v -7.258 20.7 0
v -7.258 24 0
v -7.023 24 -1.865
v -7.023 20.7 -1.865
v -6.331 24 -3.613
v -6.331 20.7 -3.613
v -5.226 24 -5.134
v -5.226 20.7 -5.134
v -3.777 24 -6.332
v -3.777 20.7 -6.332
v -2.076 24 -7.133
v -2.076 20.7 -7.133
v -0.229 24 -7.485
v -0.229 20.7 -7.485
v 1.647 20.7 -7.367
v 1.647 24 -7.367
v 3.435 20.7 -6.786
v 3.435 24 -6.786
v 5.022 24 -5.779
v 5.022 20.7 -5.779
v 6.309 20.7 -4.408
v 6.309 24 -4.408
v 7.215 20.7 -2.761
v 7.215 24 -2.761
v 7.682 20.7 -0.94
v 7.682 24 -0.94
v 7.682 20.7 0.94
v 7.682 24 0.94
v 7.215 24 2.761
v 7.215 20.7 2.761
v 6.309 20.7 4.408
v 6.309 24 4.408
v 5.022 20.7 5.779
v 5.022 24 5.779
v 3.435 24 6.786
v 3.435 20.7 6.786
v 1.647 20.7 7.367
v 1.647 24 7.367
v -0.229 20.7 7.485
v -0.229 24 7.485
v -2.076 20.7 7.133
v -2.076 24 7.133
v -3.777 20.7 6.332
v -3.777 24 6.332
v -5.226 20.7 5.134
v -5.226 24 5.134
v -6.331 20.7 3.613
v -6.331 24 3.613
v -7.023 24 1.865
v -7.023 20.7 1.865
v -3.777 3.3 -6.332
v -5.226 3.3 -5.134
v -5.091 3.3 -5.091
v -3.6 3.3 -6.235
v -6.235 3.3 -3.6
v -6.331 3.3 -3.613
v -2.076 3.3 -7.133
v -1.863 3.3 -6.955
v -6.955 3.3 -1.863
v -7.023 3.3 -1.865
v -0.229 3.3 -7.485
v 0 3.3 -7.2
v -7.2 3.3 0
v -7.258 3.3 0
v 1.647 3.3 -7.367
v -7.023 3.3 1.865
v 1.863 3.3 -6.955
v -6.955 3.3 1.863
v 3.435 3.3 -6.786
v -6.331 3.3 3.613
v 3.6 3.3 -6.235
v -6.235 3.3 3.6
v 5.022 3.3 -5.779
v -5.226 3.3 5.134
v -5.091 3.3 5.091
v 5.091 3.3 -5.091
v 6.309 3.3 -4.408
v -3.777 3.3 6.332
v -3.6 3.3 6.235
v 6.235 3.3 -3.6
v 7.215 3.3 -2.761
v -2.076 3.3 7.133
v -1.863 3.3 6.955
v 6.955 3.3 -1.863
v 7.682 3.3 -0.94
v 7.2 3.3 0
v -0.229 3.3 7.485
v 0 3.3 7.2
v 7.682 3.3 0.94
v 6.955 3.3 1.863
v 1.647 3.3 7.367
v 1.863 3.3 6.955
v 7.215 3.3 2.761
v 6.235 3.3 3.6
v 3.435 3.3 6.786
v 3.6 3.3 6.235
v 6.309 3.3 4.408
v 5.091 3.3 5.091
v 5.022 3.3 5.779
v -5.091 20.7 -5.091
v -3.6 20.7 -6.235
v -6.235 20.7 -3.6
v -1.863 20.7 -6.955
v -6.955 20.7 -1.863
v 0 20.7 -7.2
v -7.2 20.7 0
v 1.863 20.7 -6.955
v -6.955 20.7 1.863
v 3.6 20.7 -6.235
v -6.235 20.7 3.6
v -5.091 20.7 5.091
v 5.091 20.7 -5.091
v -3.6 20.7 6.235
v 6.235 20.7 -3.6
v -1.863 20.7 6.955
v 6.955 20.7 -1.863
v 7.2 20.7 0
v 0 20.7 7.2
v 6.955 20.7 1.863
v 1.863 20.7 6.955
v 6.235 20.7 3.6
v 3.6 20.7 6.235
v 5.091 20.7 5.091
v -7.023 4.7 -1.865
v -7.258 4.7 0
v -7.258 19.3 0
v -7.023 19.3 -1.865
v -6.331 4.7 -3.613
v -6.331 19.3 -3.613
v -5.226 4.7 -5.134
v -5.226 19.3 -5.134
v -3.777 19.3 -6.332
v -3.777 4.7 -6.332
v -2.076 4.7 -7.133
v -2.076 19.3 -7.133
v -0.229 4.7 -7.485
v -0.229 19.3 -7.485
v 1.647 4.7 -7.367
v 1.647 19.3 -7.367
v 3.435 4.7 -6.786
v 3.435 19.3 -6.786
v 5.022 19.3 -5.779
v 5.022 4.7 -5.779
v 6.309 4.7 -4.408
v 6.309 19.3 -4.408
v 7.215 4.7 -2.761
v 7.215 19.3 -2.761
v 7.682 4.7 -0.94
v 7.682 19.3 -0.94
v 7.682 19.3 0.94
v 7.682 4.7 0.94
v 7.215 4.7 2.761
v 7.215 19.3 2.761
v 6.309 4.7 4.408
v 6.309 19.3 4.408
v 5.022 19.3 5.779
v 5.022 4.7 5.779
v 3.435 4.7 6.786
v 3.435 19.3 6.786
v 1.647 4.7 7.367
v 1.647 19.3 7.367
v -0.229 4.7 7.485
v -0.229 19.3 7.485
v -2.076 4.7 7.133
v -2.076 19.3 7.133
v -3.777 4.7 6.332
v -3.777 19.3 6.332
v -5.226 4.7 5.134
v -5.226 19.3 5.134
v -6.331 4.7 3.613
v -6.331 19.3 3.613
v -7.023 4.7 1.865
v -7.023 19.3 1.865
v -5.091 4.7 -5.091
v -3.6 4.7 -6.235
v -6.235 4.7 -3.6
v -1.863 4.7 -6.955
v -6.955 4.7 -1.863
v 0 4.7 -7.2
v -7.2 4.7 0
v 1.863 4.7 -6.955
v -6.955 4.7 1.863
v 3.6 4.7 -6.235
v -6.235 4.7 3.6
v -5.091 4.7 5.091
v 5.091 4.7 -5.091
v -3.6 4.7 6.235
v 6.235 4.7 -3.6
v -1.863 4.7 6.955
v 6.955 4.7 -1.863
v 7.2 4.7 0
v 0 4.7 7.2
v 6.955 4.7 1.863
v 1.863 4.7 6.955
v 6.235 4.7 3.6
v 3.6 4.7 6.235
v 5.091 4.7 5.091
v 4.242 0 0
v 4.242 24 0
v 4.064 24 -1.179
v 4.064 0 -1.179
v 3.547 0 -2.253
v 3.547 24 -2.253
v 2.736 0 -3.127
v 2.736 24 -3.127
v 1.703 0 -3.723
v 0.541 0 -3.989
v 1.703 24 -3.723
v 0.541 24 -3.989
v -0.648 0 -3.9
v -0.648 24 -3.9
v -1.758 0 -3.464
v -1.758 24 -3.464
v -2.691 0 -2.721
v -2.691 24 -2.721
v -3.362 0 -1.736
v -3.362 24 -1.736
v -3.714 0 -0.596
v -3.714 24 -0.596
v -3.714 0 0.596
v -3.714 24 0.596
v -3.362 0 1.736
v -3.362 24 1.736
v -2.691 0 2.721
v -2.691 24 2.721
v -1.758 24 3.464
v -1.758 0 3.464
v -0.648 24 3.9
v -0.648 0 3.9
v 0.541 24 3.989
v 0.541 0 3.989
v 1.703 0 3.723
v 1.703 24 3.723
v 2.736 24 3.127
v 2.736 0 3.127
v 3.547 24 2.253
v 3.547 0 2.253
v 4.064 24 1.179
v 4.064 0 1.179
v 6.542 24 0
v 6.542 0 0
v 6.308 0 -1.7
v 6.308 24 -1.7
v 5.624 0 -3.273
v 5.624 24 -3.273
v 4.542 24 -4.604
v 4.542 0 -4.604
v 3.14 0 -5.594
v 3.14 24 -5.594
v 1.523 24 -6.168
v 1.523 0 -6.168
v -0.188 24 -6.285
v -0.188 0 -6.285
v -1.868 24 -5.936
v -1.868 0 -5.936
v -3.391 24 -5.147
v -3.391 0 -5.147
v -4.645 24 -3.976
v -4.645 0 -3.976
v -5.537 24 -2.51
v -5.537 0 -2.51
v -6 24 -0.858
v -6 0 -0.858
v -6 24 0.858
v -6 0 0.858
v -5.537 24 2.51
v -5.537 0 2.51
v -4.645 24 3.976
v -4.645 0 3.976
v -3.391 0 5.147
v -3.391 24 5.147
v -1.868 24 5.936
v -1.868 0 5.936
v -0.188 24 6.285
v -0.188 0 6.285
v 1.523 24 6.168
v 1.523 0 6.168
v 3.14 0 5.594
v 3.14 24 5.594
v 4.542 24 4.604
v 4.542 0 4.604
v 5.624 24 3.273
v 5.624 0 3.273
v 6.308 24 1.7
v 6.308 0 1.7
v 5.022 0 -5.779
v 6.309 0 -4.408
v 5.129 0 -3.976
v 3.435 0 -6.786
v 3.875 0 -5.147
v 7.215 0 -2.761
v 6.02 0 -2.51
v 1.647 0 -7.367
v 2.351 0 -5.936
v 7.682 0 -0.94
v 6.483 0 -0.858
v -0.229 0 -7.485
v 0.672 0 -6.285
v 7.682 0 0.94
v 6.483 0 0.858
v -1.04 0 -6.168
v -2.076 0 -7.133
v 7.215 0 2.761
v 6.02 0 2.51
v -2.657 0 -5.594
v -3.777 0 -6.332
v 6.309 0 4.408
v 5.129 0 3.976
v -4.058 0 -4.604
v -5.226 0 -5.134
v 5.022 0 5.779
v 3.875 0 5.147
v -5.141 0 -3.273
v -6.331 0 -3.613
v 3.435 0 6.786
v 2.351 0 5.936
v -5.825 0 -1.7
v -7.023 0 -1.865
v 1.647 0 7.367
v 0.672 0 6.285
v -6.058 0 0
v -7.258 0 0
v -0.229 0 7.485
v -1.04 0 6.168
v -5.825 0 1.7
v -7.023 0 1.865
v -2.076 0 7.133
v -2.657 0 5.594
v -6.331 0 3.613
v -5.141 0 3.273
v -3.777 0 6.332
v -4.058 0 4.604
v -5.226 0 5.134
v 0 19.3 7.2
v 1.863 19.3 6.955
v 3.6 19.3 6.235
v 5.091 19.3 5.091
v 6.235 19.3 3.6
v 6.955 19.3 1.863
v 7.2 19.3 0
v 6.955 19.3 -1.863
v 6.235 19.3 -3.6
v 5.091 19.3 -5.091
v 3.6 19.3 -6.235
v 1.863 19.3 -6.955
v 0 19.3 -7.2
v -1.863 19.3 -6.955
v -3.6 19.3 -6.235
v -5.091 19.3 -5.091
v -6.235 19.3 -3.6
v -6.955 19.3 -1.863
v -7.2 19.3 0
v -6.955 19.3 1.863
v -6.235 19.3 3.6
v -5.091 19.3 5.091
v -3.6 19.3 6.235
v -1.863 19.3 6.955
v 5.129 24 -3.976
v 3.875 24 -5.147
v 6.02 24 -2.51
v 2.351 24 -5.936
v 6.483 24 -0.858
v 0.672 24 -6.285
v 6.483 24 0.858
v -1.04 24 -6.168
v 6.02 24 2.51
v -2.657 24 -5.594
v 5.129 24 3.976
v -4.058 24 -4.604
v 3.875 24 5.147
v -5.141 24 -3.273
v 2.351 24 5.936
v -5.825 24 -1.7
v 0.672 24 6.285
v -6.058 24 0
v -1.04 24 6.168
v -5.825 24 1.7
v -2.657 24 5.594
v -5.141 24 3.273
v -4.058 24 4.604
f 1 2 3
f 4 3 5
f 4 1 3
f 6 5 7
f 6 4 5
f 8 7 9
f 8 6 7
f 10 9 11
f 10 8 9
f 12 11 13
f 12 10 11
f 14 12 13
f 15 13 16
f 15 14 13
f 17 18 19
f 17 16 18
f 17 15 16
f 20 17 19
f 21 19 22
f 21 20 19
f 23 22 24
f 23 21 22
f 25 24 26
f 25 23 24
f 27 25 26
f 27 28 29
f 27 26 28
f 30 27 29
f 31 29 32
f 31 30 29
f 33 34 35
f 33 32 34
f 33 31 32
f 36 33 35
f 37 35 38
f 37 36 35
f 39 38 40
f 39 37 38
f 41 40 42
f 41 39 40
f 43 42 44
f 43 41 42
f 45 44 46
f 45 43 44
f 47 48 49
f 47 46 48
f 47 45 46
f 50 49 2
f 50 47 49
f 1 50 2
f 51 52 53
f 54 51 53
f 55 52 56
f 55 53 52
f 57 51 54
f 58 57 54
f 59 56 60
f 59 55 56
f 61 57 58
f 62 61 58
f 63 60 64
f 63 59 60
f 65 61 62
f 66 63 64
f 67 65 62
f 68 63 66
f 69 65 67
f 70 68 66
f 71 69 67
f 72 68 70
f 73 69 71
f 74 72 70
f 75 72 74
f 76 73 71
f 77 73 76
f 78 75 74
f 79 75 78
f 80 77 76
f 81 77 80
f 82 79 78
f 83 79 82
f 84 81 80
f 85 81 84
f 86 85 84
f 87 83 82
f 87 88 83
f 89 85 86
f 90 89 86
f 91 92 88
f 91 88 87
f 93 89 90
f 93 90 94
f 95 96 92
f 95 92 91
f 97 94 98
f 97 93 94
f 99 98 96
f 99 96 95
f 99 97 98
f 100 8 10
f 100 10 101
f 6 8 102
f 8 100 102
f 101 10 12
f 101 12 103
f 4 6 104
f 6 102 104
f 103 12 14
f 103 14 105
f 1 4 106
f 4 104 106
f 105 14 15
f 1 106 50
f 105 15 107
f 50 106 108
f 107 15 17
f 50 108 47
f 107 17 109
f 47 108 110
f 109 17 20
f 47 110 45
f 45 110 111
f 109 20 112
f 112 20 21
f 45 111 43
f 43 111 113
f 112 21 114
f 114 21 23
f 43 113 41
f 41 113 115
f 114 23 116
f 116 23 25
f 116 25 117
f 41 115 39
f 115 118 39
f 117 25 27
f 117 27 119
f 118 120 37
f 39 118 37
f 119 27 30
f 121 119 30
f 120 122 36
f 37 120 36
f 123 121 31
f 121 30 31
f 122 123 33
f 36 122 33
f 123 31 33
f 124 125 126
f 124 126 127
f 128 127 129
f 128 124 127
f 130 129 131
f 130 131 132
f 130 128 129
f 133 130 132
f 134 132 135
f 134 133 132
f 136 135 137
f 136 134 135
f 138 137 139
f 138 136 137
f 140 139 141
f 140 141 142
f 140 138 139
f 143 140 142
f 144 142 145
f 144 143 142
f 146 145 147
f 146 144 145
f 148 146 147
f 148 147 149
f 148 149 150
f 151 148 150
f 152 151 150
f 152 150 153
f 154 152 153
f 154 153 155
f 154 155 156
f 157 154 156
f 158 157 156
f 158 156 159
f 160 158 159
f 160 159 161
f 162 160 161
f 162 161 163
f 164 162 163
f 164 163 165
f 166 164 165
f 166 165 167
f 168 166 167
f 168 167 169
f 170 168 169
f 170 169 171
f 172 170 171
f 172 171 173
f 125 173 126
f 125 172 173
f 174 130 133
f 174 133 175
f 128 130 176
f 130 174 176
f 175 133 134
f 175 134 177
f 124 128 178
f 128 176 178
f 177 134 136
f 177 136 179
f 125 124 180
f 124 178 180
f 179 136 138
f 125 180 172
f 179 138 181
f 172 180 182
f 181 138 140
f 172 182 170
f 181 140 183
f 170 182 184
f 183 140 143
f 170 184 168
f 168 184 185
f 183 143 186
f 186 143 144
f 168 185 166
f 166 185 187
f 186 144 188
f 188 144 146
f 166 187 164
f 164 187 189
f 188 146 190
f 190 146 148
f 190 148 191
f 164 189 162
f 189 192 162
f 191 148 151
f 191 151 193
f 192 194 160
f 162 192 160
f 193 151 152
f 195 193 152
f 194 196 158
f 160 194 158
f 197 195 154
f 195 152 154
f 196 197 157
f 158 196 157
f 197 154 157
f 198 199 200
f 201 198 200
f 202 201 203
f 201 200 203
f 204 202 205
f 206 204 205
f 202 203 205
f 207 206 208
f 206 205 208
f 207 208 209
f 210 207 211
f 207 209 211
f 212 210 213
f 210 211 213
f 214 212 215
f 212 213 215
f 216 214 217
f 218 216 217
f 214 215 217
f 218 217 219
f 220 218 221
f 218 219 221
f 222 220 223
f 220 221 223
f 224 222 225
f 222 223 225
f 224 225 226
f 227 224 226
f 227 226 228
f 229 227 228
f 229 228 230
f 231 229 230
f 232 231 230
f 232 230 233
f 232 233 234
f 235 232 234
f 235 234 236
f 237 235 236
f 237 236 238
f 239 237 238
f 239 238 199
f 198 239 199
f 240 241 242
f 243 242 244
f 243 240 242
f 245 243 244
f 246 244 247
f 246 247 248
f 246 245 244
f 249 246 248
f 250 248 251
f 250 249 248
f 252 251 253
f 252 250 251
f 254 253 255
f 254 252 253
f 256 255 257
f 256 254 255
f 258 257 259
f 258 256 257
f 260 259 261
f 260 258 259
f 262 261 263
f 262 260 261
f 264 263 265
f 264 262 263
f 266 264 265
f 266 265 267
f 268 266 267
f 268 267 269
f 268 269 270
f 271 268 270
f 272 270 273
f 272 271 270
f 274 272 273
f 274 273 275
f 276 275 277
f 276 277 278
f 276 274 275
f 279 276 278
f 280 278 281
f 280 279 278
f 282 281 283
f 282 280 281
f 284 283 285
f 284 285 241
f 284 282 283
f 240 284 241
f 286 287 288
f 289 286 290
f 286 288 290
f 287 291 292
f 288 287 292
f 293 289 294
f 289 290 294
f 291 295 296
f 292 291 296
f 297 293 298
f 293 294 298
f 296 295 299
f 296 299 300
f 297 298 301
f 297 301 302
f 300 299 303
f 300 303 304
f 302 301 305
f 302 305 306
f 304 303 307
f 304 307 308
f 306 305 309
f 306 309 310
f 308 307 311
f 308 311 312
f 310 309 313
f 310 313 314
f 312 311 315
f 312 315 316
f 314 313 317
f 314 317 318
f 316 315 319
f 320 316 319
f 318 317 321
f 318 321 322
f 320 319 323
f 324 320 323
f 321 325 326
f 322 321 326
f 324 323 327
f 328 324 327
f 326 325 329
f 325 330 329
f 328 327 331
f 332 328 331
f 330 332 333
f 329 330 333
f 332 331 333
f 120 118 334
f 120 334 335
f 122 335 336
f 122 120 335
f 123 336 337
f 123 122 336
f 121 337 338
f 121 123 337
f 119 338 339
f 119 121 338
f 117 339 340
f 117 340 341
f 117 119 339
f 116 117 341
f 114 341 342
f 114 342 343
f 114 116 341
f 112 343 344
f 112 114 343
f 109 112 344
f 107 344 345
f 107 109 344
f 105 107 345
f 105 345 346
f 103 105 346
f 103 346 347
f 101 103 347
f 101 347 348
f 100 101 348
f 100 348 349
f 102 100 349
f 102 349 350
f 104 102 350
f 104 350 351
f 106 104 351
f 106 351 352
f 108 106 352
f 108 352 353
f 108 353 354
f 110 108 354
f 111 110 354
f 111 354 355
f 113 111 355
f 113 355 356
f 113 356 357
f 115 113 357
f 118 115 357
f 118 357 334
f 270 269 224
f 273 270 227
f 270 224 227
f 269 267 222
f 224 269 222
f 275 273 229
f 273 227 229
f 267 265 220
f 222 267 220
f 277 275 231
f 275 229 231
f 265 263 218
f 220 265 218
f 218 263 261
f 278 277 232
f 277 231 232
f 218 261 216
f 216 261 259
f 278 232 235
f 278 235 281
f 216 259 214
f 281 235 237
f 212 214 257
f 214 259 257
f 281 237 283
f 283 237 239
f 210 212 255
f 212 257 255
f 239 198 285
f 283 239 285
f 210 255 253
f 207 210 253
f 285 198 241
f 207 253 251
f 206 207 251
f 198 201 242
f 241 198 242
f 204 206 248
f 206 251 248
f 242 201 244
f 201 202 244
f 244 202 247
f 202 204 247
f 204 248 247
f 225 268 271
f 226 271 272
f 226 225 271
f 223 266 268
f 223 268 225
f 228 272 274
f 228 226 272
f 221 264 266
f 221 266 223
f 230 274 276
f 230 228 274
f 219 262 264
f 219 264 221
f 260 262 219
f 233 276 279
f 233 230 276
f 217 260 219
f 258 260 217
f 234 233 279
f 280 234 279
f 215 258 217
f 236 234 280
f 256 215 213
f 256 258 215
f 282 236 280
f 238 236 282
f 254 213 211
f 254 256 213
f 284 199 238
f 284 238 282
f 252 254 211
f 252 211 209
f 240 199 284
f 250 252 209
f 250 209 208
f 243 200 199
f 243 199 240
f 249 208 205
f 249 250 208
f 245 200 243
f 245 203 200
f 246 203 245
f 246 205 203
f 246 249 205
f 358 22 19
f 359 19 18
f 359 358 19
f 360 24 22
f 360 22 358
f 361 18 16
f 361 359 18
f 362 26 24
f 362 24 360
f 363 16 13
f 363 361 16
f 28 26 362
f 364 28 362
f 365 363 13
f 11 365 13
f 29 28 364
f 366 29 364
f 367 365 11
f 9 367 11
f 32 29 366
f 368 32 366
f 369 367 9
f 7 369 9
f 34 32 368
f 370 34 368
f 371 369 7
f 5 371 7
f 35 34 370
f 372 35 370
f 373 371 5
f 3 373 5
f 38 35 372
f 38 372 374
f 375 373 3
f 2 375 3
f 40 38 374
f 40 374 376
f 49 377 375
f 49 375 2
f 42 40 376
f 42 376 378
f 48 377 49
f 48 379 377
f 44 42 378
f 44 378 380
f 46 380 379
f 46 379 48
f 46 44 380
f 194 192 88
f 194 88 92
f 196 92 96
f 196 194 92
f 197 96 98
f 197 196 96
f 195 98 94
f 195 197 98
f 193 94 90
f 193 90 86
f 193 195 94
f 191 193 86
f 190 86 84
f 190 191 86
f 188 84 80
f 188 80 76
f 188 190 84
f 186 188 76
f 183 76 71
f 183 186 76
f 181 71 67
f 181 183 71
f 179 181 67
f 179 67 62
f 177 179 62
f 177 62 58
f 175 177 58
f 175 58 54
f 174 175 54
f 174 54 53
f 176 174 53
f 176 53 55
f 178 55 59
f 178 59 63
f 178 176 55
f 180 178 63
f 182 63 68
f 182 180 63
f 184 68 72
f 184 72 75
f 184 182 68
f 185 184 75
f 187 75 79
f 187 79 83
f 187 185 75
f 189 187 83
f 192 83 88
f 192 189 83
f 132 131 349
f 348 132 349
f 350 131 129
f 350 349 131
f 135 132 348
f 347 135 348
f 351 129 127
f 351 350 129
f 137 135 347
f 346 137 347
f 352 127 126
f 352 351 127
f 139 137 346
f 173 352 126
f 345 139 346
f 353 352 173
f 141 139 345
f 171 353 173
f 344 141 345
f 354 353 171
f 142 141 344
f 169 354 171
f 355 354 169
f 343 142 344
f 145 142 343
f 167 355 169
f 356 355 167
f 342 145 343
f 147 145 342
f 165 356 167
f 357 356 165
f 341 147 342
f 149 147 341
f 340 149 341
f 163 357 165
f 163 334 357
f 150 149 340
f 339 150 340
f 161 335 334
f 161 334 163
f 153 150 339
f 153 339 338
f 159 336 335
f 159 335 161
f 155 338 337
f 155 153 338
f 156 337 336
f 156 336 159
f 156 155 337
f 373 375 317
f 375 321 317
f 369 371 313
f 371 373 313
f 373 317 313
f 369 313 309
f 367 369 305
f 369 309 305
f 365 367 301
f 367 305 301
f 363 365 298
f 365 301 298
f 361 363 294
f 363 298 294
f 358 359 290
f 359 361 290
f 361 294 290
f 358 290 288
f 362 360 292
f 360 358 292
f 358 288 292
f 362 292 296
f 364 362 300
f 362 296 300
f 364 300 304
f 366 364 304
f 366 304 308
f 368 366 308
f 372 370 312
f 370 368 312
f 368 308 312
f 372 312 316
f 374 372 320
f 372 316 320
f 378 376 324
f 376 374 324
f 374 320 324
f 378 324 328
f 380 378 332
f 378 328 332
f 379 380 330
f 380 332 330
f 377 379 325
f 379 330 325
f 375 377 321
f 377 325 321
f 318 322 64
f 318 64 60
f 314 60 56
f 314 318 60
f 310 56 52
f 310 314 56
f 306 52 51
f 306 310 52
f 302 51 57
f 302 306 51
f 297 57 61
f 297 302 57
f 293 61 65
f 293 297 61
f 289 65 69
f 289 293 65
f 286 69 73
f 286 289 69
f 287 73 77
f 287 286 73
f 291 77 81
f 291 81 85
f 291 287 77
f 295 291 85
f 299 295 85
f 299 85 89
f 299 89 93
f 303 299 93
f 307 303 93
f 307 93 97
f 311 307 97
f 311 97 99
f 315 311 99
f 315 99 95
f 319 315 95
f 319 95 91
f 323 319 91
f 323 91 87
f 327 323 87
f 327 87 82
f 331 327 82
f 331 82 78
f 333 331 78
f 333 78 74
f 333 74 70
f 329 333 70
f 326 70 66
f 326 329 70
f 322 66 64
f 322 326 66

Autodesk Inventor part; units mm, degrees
ref_plane "YZ Plane" through (0, 0, 0) normal (1, 0, 0) x (0, 1, 0)
ref_plane "XZ Plane" through (0, 0, 0) normal (0, 1, 0) x (-1, 0, 0)
ref_plane "XY Plane" through (0, 0, 0) normal (0, 0, 1) x (1, 0, 0)
sketch "Эскиз1" plane through (0, 0, 0) normal (0, 1, 0) x (-1, 0, 0)
  circle A0 centre (-0.2416, 0) radius 7.5
  circle A1 centre (-0.2416, 0) radius 6.3
  point P0 (0, 0)
  dimension "d0" = 15
  dimension "d2" = 12.6
extrude "Выдавливание1" add sketch "Эскиз1" along normal blind 24
sketch "Эскиз2" plane through (0.2416, 24, 0) normal (0, 1, 0) x (1, 0, 0)
  circle A0 centre (0, 0) radius 6.3 projected
  circle A1 centre (0, 0) radius 4
  circle A2 centre (0, 0) radius 6.3
  point P0 (-0.2416, 0)
  dimension "d7" = 8
  dimension "d8" = 12.6
extrude "Выдавливание2" add sketch "Эскиз2" against normal blind 24 separate body
sketch "Эскиз3" plane through (0, 0, 0) normal (1, 0, 0) x (0, 1, 0)
  line L0 (20.7, 9.5) -> (19.3, 9.5)
  line L1 (19.3, 9.5) -> (19.3, 7.2)
  line L2 (19.3, 7.2) -> (20.7, 7.2)
  line L3 (20.7, 7.2) -> (20.7, 9.5)
  line L4 (4.7, 9.5) -> (3.3, 9.5)
  line L5 (3.3, 9.5) -> (3.3, 7.2)
  line L6 (3.3, 7.2) -> (4.7, 7.2)
  line L7 (4.7, 7.2) -> (4.7, 9.5)
  line L8 (24, -7.5) -> (24, 7.5) projected
  line L9 (0, -7.5) -> (0, 7.5) projected
  line L10 (24, 7.5) -> (0, 7.5) construction
  line L11 (-4.8, 0) -> (28.8, 0) projected
  point P0 (0, 0)
  dimension "d11" = 1.4
  dimension "d12" = 1.4
  dimension "d13" = 3.3
  dimension "d14" = 3.3
  dimension "d15" = 0.3
  dimension "d16" = 2
revolve "Вращение1" cut sketch "Эскиз3" angle 360 about axis through (0, -10, 0) along (0, 1, 0) bodies 1
equation "\"d12\" = d11"
properties part number "Линейный подшипник"
